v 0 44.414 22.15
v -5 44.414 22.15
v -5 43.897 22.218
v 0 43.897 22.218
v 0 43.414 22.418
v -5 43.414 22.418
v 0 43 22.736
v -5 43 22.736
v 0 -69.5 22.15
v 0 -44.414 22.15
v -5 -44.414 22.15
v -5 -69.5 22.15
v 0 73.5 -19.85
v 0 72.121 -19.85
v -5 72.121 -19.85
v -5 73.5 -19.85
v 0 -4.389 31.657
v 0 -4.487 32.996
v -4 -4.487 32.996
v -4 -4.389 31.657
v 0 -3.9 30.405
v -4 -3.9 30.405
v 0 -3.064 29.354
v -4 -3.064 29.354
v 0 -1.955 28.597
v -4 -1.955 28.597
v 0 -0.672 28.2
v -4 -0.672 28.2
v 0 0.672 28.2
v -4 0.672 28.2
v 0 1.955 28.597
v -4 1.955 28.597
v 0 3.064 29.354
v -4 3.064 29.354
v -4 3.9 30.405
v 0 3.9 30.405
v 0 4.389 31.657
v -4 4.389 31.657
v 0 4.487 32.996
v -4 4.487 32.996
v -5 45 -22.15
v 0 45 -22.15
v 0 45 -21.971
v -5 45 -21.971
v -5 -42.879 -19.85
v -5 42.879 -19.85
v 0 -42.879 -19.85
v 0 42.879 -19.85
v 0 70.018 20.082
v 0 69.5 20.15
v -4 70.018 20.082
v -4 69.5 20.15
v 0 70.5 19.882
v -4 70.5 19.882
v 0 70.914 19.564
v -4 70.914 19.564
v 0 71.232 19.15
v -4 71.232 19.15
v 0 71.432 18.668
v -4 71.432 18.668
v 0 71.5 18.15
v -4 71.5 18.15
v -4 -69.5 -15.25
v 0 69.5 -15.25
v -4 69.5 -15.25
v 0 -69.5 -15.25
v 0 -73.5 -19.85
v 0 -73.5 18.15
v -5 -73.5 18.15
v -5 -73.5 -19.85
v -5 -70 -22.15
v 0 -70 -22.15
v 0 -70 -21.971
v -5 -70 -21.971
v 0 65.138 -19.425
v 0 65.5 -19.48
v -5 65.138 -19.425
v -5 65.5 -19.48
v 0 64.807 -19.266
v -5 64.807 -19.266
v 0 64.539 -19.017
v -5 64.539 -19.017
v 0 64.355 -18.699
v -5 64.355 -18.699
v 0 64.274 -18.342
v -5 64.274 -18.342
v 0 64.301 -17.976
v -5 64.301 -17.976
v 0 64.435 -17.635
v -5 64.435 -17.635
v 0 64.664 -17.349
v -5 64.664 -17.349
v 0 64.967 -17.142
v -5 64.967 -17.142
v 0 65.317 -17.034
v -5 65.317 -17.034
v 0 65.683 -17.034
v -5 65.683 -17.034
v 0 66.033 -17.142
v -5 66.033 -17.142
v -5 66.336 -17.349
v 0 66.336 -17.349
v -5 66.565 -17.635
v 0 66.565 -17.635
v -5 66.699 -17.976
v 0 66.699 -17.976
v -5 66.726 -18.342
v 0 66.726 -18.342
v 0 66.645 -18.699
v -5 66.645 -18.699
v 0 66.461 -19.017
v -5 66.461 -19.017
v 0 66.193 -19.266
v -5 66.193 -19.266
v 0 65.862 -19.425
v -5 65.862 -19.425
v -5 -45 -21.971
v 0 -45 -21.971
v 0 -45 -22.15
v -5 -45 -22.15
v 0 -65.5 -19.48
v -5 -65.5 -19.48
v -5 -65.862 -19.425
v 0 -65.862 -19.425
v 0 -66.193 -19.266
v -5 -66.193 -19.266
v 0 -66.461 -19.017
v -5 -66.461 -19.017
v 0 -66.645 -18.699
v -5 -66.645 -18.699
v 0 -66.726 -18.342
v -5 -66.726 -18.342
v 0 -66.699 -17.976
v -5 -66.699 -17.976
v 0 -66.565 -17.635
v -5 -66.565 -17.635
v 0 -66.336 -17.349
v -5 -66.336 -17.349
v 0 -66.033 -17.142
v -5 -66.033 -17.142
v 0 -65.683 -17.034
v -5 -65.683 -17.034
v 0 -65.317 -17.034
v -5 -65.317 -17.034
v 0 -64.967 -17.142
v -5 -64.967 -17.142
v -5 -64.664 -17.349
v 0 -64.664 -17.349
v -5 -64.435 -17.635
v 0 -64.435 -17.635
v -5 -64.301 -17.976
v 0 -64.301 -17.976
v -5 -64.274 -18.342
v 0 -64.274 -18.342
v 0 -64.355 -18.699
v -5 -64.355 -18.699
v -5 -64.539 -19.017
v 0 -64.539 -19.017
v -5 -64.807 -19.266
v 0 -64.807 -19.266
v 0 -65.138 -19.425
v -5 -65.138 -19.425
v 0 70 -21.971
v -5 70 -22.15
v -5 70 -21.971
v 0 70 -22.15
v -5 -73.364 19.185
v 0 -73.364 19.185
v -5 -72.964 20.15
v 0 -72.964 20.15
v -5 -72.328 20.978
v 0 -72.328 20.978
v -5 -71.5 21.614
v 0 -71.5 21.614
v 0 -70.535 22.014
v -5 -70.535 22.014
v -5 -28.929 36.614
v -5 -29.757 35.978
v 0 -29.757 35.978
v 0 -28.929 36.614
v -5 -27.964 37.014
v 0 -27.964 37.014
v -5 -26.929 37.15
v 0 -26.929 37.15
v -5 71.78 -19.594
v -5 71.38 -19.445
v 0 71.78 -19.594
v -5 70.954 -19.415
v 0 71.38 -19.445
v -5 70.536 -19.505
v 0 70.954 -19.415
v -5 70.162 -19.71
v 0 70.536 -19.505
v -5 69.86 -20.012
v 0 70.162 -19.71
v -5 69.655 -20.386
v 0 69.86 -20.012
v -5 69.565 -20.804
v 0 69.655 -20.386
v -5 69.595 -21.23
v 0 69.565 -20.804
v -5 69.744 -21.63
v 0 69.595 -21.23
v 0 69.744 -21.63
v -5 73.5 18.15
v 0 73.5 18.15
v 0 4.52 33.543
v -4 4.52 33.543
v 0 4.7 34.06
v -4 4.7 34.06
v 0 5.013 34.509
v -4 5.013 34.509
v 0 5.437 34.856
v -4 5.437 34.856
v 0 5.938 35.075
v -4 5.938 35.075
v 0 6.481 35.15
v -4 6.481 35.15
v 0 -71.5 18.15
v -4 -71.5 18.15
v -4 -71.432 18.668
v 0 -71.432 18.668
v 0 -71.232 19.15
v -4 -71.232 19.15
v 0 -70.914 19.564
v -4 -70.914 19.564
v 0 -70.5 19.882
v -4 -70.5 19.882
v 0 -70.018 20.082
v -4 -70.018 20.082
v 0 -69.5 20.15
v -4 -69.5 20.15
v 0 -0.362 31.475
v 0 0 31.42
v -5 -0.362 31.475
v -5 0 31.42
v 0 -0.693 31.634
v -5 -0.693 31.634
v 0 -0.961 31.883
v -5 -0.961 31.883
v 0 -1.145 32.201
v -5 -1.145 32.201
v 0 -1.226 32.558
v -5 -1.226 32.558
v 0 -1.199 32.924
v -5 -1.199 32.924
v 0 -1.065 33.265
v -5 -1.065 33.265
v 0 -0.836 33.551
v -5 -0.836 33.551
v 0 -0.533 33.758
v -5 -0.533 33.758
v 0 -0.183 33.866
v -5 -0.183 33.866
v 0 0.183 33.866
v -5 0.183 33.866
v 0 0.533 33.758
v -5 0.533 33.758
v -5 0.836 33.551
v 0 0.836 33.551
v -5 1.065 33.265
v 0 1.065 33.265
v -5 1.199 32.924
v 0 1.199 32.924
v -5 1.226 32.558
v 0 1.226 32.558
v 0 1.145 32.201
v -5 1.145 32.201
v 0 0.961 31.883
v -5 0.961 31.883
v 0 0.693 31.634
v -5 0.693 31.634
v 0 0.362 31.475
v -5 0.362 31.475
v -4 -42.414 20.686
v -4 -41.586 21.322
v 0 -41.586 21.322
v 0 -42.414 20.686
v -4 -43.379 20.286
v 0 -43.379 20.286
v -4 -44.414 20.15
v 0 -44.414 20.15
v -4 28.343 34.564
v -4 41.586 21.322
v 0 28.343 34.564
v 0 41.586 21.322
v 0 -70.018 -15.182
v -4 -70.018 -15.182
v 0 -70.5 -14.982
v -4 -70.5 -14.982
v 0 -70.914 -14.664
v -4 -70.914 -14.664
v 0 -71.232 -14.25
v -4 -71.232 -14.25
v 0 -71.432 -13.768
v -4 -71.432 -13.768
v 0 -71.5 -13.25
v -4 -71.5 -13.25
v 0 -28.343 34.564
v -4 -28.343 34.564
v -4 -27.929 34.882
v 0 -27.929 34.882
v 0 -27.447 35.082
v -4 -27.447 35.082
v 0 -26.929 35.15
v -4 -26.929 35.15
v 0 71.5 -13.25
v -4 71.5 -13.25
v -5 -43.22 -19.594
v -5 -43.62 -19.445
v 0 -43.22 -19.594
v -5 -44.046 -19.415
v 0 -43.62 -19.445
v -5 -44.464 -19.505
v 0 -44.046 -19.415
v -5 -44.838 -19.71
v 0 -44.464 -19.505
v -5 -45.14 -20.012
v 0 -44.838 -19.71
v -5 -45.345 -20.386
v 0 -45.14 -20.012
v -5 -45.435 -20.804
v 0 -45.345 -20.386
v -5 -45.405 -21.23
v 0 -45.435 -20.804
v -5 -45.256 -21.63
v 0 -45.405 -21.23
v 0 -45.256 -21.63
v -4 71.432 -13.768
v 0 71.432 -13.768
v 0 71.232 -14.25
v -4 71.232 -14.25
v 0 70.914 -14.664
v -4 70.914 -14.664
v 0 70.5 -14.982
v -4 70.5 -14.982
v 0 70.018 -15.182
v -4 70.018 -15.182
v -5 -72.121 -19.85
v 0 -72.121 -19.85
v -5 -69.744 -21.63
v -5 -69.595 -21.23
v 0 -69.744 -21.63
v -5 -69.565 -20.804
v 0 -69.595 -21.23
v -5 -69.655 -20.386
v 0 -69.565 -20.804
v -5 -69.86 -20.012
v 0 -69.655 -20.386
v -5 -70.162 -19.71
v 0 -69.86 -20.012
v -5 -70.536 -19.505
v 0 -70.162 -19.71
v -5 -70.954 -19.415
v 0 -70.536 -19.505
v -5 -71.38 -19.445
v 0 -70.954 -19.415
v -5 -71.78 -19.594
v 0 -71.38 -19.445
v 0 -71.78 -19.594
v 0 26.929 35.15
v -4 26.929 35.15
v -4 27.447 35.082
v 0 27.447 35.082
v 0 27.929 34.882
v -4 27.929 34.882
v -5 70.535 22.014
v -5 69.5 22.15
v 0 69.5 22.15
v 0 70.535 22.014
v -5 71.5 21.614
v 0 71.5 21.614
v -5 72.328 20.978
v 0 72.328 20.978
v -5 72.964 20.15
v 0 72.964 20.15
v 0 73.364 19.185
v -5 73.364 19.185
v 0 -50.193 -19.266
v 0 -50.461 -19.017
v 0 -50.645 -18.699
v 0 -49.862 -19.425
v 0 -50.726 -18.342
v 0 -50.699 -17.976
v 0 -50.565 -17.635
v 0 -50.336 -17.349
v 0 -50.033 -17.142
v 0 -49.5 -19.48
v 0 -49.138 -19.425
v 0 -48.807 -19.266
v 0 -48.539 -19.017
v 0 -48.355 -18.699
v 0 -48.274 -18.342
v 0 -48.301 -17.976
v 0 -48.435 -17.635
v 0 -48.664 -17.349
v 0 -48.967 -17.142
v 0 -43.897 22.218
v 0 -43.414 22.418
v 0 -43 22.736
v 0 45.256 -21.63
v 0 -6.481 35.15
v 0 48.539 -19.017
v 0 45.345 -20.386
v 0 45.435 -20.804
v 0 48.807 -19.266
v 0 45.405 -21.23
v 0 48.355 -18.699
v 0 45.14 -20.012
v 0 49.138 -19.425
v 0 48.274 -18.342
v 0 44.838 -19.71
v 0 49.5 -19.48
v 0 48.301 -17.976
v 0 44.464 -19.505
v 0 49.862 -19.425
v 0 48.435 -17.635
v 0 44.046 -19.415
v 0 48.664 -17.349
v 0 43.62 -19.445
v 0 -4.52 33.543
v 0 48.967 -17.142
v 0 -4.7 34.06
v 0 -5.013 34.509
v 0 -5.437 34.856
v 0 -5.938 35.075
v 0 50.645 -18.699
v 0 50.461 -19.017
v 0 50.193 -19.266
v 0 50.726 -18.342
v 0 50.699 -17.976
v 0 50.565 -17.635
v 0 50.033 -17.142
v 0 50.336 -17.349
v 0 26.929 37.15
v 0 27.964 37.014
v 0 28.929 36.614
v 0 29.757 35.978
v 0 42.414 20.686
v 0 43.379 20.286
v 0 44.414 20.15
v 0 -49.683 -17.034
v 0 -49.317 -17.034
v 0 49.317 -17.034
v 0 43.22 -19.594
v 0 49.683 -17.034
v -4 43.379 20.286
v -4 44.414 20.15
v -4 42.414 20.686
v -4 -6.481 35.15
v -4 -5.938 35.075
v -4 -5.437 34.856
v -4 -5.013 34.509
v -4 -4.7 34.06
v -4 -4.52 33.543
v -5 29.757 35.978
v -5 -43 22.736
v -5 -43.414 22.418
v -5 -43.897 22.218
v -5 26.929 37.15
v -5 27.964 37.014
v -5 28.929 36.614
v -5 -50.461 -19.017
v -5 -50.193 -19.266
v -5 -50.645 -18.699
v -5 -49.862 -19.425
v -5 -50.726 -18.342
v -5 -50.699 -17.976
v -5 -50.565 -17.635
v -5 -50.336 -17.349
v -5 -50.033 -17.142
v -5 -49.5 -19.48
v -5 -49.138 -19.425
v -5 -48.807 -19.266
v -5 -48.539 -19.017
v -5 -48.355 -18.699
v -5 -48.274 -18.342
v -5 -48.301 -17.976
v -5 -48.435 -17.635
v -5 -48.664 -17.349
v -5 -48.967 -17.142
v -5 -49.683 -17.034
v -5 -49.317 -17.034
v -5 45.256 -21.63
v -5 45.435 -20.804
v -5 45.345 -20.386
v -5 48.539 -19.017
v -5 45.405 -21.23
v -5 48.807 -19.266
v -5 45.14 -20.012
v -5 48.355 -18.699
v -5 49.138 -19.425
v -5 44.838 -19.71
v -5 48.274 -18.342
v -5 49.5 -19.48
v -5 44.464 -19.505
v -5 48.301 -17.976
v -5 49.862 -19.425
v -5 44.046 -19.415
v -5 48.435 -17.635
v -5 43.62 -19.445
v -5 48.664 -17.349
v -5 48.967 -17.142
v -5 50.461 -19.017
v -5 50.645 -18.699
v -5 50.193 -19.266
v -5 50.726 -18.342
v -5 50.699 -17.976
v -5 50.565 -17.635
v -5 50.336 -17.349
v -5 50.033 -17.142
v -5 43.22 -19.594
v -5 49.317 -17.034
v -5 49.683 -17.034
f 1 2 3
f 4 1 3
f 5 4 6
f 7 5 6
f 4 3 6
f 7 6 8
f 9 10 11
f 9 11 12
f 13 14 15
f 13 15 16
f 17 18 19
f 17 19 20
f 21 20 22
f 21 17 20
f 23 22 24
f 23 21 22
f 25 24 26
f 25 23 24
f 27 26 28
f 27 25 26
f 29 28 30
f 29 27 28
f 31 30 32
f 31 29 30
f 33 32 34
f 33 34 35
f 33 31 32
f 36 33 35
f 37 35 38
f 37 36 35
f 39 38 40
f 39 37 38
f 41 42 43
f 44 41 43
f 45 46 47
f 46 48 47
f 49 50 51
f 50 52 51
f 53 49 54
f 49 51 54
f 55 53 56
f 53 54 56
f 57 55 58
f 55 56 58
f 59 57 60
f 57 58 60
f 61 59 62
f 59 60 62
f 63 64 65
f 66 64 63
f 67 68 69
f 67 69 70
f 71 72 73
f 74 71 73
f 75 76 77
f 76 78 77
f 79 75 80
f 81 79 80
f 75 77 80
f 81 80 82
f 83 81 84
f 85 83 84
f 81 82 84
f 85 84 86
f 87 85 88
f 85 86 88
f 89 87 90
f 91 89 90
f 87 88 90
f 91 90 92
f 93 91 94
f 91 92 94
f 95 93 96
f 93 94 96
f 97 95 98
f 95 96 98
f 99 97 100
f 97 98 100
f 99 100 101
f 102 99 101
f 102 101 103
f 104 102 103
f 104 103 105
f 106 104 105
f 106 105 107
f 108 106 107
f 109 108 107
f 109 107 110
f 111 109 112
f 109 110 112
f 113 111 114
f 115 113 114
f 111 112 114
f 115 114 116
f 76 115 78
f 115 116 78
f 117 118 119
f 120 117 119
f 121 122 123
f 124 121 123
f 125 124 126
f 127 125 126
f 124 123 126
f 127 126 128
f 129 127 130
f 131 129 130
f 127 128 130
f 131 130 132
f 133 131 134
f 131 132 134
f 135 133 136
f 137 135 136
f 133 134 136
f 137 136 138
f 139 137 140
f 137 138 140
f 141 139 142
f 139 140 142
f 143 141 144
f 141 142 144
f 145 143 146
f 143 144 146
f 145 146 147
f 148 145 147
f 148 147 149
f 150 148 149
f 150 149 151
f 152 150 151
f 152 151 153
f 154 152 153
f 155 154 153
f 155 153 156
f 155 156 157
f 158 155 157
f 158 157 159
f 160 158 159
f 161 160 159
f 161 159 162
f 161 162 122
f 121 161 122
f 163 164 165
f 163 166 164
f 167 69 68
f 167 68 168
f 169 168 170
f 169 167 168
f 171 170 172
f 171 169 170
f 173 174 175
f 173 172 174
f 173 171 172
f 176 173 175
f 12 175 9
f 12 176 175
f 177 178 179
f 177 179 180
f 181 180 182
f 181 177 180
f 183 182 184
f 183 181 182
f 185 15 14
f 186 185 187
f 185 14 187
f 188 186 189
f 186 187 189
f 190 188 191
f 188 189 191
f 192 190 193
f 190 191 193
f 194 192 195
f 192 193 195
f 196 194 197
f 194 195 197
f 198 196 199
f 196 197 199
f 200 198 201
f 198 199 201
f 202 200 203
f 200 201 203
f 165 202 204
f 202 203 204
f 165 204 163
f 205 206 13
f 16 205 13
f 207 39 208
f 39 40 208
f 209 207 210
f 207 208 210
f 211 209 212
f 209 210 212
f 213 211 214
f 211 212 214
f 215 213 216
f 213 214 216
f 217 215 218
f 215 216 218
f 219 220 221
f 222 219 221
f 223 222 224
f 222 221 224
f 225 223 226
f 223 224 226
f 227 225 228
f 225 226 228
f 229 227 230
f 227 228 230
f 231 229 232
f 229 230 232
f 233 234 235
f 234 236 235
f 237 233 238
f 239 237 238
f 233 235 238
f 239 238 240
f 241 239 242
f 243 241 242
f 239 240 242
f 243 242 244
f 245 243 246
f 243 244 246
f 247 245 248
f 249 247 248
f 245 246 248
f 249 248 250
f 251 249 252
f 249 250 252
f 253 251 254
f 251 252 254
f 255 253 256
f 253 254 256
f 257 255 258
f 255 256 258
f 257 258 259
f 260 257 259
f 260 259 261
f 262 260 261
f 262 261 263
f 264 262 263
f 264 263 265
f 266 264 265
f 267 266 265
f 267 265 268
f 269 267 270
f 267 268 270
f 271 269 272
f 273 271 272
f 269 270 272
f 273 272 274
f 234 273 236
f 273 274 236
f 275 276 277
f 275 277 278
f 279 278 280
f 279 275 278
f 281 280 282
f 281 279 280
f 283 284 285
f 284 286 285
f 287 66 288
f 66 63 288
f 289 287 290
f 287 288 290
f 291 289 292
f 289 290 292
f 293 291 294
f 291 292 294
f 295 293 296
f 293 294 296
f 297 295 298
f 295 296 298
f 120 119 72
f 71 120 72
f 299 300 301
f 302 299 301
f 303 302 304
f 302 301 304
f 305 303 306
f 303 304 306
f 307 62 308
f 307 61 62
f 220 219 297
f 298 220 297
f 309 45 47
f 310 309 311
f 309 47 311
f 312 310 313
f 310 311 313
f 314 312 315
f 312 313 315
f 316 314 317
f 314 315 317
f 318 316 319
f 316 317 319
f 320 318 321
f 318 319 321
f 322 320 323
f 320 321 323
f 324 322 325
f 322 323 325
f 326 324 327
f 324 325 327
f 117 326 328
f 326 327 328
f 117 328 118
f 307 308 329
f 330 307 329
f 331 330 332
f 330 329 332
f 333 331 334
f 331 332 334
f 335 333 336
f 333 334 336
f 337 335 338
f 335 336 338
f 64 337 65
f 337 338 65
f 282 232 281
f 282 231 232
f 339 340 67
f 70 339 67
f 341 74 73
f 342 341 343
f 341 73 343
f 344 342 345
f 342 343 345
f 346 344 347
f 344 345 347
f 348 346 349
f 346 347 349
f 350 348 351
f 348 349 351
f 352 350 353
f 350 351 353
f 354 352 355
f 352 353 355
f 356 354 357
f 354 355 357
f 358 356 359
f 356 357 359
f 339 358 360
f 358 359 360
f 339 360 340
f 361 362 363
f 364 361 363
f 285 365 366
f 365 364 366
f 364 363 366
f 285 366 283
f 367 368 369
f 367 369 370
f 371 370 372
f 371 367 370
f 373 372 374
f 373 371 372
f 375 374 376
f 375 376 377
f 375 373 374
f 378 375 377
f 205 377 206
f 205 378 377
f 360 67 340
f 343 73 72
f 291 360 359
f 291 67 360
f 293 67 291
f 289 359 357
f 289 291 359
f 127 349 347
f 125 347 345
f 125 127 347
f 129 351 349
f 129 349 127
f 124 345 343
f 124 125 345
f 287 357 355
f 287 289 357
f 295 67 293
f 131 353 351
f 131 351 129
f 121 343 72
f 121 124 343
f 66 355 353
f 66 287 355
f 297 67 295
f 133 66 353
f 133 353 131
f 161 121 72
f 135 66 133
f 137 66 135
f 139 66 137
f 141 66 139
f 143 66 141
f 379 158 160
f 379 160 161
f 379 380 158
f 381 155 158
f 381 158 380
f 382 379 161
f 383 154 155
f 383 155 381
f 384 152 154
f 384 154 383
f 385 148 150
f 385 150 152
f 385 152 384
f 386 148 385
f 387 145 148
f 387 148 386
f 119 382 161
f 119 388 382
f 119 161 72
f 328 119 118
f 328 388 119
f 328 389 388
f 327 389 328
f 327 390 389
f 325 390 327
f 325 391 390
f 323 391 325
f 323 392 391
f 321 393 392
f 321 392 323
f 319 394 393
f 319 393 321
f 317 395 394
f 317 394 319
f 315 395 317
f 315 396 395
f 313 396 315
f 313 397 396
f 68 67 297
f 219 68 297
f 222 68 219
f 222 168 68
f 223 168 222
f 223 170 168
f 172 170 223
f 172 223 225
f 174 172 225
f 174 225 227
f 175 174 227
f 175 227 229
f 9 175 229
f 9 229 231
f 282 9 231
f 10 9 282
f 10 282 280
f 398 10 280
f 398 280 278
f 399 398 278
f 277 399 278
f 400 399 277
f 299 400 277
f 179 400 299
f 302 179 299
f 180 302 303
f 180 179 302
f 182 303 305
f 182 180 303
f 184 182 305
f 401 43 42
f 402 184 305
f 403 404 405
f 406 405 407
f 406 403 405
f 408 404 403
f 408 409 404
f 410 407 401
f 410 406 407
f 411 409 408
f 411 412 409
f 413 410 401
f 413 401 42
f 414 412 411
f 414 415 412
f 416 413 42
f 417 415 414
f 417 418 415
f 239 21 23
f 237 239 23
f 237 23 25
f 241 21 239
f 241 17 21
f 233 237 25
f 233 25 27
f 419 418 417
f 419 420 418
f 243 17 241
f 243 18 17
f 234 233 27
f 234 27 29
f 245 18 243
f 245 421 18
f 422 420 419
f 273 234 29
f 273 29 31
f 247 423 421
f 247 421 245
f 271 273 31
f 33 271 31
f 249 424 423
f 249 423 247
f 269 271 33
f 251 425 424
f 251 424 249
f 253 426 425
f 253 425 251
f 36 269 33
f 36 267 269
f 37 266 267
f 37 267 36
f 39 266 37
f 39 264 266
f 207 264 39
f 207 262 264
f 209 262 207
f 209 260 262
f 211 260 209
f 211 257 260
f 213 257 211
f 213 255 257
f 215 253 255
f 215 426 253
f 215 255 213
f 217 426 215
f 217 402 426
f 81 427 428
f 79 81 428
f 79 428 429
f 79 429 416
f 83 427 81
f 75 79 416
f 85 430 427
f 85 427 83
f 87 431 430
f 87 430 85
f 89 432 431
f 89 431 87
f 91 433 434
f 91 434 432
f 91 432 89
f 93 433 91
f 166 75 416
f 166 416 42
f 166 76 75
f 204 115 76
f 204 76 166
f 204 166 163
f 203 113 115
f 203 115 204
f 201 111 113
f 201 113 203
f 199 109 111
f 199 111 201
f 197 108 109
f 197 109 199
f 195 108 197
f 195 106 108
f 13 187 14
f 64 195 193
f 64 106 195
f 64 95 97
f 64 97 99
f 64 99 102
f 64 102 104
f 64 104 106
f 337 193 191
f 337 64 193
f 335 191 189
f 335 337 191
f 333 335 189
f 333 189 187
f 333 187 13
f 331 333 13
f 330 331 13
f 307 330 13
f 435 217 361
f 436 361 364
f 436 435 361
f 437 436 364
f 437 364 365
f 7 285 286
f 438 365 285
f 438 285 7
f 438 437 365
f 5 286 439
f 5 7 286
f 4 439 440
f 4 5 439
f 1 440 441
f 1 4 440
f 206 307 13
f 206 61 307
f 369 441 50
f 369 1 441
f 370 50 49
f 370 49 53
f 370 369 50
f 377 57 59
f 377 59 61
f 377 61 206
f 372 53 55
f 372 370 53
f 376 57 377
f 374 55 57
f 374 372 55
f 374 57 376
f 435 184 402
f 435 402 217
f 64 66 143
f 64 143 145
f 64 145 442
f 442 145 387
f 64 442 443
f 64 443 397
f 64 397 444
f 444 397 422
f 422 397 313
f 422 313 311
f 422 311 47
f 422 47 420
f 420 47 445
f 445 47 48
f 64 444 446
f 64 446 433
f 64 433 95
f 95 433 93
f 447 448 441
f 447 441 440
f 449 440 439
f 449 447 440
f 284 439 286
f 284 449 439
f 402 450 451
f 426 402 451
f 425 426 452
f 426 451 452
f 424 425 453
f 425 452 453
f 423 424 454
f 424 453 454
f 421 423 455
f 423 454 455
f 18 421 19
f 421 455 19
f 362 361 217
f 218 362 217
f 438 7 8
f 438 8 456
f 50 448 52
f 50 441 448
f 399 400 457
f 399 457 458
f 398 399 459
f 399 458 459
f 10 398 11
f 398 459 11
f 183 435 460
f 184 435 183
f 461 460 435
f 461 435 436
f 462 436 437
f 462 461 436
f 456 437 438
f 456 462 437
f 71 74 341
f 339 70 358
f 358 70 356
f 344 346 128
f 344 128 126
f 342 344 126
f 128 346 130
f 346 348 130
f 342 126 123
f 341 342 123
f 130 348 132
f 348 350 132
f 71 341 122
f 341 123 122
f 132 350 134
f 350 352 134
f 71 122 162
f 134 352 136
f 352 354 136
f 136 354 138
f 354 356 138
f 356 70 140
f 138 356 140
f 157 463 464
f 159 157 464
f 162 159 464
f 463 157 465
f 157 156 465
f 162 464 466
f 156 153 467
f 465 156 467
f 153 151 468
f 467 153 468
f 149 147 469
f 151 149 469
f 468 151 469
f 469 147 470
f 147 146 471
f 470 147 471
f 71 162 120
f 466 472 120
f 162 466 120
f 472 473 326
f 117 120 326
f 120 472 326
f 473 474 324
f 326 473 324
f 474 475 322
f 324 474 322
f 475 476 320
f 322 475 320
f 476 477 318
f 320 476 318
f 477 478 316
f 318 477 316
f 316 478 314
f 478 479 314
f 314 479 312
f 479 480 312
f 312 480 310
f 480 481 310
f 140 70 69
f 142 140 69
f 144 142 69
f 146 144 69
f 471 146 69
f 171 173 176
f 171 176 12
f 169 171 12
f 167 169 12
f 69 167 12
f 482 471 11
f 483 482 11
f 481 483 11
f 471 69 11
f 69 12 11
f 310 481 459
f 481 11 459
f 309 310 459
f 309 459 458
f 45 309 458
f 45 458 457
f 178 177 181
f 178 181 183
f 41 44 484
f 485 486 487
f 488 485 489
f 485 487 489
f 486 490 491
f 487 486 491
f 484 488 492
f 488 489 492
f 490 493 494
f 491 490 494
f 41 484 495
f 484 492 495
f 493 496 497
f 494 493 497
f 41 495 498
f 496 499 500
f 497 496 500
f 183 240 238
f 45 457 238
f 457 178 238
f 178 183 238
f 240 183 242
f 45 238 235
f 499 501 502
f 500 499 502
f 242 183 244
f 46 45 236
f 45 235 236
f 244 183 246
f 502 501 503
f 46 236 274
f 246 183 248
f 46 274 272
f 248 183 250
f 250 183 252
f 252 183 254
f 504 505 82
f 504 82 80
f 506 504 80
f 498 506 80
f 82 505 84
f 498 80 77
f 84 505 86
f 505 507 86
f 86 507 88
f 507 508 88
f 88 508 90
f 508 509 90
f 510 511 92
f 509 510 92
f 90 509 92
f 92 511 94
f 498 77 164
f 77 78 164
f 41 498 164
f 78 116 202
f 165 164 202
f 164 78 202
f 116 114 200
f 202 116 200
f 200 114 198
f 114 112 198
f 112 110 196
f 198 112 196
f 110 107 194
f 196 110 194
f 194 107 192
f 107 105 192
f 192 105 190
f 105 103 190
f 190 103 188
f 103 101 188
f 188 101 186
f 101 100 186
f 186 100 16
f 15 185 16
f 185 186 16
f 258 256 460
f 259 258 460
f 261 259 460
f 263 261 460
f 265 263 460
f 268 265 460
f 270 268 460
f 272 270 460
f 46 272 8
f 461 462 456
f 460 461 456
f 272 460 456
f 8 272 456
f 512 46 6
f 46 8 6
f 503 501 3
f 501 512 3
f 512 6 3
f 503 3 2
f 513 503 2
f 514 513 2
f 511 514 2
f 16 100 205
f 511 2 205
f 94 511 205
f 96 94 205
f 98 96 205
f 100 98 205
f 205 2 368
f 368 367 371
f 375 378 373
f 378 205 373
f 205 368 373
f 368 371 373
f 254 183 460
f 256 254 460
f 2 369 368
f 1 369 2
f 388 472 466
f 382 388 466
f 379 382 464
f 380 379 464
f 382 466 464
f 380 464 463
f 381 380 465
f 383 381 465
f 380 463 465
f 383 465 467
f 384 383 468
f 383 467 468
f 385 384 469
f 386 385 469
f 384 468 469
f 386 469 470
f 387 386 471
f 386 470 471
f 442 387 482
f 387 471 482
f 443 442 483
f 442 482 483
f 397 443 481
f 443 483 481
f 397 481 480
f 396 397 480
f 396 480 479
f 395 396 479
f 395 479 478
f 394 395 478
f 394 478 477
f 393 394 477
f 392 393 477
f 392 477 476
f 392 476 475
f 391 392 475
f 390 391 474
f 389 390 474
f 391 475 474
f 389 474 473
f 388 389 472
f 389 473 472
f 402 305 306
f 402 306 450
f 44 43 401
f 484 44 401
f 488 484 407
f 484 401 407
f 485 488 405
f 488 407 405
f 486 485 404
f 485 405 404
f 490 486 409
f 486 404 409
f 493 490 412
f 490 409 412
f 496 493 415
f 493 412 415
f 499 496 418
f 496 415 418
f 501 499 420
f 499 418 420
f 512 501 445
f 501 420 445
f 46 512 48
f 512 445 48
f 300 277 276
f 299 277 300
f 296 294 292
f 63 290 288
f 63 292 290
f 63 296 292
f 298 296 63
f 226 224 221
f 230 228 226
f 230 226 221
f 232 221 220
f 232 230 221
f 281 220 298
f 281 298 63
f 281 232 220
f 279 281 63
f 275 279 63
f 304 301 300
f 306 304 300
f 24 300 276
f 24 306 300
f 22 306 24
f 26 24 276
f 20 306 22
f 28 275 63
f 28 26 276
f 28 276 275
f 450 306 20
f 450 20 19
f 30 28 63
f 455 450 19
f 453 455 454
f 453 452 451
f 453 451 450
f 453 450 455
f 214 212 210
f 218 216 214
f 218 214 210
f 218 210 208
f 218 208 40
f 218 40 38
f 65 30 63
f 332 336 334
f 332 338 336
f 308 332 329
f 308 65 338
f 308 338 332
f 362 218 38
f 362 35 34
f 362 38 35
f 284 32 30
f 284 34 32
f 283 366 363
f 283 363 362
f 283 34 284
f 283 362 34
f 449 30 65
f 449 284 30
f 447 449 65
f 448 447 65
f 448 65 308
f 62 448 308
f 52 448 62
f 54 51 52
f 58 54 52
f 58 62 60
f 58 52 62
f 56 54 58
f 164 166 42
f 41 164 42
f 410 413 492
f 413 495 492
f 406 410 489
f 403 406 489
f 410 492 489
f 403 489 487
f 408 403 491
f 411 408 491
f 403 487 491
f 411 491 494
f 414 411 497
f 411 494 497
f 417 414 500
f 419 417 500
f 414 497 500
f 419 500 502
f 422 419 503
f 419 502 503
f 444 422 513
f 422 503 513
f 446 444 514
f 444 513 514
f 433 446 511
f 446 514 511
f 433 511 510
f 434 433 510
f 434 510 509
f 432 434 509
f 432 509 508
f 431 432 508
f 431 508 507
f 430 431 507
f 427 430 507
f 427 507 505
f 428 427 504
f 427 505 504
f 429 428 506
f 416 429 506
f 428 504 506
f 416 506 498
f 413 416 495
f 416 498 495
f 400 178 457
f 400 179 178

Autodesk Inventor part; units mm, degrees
ref_plane "YZ Plane" through (0, 0, 0) normal (1, 0, 0) x (0, 1, 0)
ref_plane "XZ Plane" through (0, 0, 0) normal (0, 1, 0) x (-1, 0, 0)
ref_plane "XY Plane" through (0, 0, 0) normal (0, 0, 1) x (1, 0, 0)
sketch "Sketch1" plane through (0, 0, 0) normal (1, 0, 0) x (0, 1, 0)
  line L0 (-73.5, -22.15) -> (73.5, -22.15) construction
  line L1 (73.5, 22.15) -> (-73.5, 22.15) construction
  line L2 (-73.5, 22.15) -> (-73.5, -22.15) construction
  line L3 (-73.5, -22.15) -> (73.5, 22.15) construction
  line L4 (73.5, -22.15) -> (-73.5, 22.15) construction
  line L5 (-73.5, 0) -> (73.5, 0) construction
  line L6 (0, 22.15) -> (0, -22.15) construction
  line L7 (49.5, -18.25) -> (65.5, -18.25) construction
  line L8 (45, -22.15) -> (45, -14.25) construction
  line L9 (45, -14.25) -> (70, -14.25) construction
  line L10 (70, -14.25) -> (70, -22.15) construction
  line L11 (57.5, -14.25) -> (57.5, -22.15) construction
  line L12 (-49.5, -18.25) -> (-65.5, -18.25) construction
  line L13 (-45, -22.15) -> (-45, -14.25) construction
  line L14 (-45, -14.25) -> (-70, -14.25) construction
  line L15 (-70, -14.25) -> (-70, -22.15) construction
  line L16 (-57.5, -14.25) -> (-57.5, -22.15) construction
  line L17 (-73.5, 17.15) -> (69, 17.15) construction
  line L18 (45, -22.15) -> (45, -19.85)
  line L19 (45, -19.85) -> (-45, -19.85)
  line L20 (-45, -19.85) -> (-45, -22.15)
  line L21 (-70, -20.35) -> (70, -20.35) construction
  line L22 (73.5, 22.15) -> (73.5, -22.15) construction
  line L23 (70, -22.15) -> (70, -19.85)
  line L24 (70, -19.85) -> (73.5, -19.85)
  line L25 (-70, -22.15) -> (-70, -19.85)
  line L26 (-70, -19.85) -> (-73.5, -19.85)
  line L27 (71.5, 20.15) -> (71.5, 8.9)
  line L28 (71.5, -15.25) -> (-71.5, -15.25)
  line L29 (71.5, 20.15) -> (-71.5, 20.15) construction
  circle A0 centre (49.5, -18.25) radius 3 construction
  line L30 (71.5, 20.15) -> (71.5, -15.25)
  line L31 (-71.5, 20.15) -> (-71.5, -15.25)
  line L32 (73.5, 22.15) -> (73.5, -19.85)
  line L33 (-73.5, 22.15) -> (-73.5, -19.85)
  line L34 (70, -22.15) -> (45, -22.15)
  line L35 (-45, -22.15) -> (-70, -22.15)
  arc A1 (72.1213, -19.85) -> (70, -21.9713) centre (71.0607, -20.9107) ccw
  arc A2 (45, -21.9713) -> (42.8787, -19.85) centre (43.9393, -20.9107) ccw
  arc A3 (-70, -21.9713) -> (-72.1213, -19.85) centre (-71.0607, -20.9107) ccw
  arc A4 (-42.8787, -19.85) -> (-45, -21.9713) centre (-43.9393, -20.9107) ccw
  line L36 (73.5, 23.15) -> (-73.5, 23.15) construction
  line L37 (43.5858, 22.15) -> (28.5858, 37.15)
  line L38 (28.5858, 37.15) -> (-28.5858, 37.15)
  line L39 (-28.5858, 37.15) -> (-43.5858, 22.15)
  line L40 (-44, 23.15) -> (-29, 38.15) construction
  line L41 (-29, 38.15) -> (29, 38.15) construction
  line L42 (29, 38.15) -> (44, 23.15) construction
  line L43 (42.7574, 20.15) -> (27.7574, 35.15)
  line L44 (27.7574, 35.15) -> (3.7417, 35.15)
  arc A5 (-3.7417, 35.15) -> (3.7417, 35.15) centre (0, 32.65) ccw
  line L45 (-42.7574, 20.15) -> (-27.7574, 35.15)
  line L46 (-27.7574, 35.15) -> (-3.7417, 35.15)
  line L47 (-71.5, 20.15) -> (-42.7574, 20.15)
  line L48 (-43.5858, 22.15) -> (-73.5, 22.15)
  line L49 (42.7574, 20.15) -> (71.5, 20.15)
  line L50 (73.5, 22.15) -> (43.5858, 22.15)
  point P0 (0, 0)
  point P1 (-73.5, -22.15)
  point P2 (-45, -22.15)
  point P3 (-45, -22.15)
  point P4 (-73.5, -19.85)
  point P5 (-70, -22.15)
  point P6 (-72.1213, -19.85)
  point P7 (-70, -21.9713)
  point P8 (-45, -21.9713)
  point P9 (-42.8787, -19.85)
  point P10 (42.8787, -19.85)
  point P11 (45, -21.9713)
  point P12 (-45, -19.85)
  point P13 (45, -19.85)
  point P14 (-70, -19.85)
  point P15 (-63.7555, -20)
  point P16 (-39.2445, -20)
  point P17 (39.2445, -20)
  point P18 (63.7555, -20)
  point P19 (71.5, 8.9)
  dimension "d0" = 147
  dimension "d2" = 16
  dimension "d3" = 3.9
  dimension "d4" = 25
  dimension "d5" = 7.9
  dimension "d18" = 5
  dimension "d35" = 2.1
  dimension "d36" = 0.5
  dimension "d38" = 115
  dimension "d47" = 2
  dimension "d50" = 6
  dimension "d53" = 2
  dimension "d56" = 1.5
  dimension "d57" = 42.5
  dimension "d59" = 1
  dimension "d60" = 14
  dimension "d63" = 45
  dimension "d64" = 15
  dimension "d65" = 1
  dimension "d66" = 1
  dimension "d67" = 88
  dimension "d68" = 43.5
  dimension "d69" = 4.5
  dimension "d70" = 2
  dimension "d71" = 2
extrude "Extrusion1" add sketch "Sketch1" against normal blind 5 contours L18 A2 L19 A4 L20 L35 L25 A3 L26 L33 L48 L39 L38 L37 L50 L32 L24 A1 L23 L34 | L27 L30 L28 L31 L47 L45 L46 A5 L44 L43 L49
extrude "Extrusion2" cut sketch "Sketch1" against normal blind 4 contours L27 L30 L28 L31 L47 L45 L46 A5 L44 L43 L49
hole "M3" at (0, 49.5, -18.25) at (0, 65.5, -18.25) at (0, -65.5, -18.25) at (0, -49.5, -18.25) at (0, 0, 32.65) direction (-1, 0, 0) diameter 2.459 end through all thread size "M3x0.5" class "6H" standard "ANSI Metric M Profile"
fillet "R2" radius 2 10 edges at (-2, 71.5, -15.25) (-2, -71.5, -15.25) (-2, -71.5, 20.15) (-2.5, -43.5858, 22.15) (-2.5, 43.5858, 22.15) (-2, -27.7574, 35.15) (-2, -3.7417, 35.15) (-2, 3.7417, 35.15) (-2, 27.7574, 35.15) (-2, 71.5, 20.15)
fillet "R4" radius 4 6 edges at (-2.5, 73.5, 22.15) (-2.5, -28.5858, 37.15) (-2.5, 28.5858, 37.15) (-2.5, -73.5, 22.15) (-2, -42.7574, 20.15) (-2, 42.7574, 20.15)
properties part number "TorsoPelvisCoverFrame" material "Acetal Resin, Black"
